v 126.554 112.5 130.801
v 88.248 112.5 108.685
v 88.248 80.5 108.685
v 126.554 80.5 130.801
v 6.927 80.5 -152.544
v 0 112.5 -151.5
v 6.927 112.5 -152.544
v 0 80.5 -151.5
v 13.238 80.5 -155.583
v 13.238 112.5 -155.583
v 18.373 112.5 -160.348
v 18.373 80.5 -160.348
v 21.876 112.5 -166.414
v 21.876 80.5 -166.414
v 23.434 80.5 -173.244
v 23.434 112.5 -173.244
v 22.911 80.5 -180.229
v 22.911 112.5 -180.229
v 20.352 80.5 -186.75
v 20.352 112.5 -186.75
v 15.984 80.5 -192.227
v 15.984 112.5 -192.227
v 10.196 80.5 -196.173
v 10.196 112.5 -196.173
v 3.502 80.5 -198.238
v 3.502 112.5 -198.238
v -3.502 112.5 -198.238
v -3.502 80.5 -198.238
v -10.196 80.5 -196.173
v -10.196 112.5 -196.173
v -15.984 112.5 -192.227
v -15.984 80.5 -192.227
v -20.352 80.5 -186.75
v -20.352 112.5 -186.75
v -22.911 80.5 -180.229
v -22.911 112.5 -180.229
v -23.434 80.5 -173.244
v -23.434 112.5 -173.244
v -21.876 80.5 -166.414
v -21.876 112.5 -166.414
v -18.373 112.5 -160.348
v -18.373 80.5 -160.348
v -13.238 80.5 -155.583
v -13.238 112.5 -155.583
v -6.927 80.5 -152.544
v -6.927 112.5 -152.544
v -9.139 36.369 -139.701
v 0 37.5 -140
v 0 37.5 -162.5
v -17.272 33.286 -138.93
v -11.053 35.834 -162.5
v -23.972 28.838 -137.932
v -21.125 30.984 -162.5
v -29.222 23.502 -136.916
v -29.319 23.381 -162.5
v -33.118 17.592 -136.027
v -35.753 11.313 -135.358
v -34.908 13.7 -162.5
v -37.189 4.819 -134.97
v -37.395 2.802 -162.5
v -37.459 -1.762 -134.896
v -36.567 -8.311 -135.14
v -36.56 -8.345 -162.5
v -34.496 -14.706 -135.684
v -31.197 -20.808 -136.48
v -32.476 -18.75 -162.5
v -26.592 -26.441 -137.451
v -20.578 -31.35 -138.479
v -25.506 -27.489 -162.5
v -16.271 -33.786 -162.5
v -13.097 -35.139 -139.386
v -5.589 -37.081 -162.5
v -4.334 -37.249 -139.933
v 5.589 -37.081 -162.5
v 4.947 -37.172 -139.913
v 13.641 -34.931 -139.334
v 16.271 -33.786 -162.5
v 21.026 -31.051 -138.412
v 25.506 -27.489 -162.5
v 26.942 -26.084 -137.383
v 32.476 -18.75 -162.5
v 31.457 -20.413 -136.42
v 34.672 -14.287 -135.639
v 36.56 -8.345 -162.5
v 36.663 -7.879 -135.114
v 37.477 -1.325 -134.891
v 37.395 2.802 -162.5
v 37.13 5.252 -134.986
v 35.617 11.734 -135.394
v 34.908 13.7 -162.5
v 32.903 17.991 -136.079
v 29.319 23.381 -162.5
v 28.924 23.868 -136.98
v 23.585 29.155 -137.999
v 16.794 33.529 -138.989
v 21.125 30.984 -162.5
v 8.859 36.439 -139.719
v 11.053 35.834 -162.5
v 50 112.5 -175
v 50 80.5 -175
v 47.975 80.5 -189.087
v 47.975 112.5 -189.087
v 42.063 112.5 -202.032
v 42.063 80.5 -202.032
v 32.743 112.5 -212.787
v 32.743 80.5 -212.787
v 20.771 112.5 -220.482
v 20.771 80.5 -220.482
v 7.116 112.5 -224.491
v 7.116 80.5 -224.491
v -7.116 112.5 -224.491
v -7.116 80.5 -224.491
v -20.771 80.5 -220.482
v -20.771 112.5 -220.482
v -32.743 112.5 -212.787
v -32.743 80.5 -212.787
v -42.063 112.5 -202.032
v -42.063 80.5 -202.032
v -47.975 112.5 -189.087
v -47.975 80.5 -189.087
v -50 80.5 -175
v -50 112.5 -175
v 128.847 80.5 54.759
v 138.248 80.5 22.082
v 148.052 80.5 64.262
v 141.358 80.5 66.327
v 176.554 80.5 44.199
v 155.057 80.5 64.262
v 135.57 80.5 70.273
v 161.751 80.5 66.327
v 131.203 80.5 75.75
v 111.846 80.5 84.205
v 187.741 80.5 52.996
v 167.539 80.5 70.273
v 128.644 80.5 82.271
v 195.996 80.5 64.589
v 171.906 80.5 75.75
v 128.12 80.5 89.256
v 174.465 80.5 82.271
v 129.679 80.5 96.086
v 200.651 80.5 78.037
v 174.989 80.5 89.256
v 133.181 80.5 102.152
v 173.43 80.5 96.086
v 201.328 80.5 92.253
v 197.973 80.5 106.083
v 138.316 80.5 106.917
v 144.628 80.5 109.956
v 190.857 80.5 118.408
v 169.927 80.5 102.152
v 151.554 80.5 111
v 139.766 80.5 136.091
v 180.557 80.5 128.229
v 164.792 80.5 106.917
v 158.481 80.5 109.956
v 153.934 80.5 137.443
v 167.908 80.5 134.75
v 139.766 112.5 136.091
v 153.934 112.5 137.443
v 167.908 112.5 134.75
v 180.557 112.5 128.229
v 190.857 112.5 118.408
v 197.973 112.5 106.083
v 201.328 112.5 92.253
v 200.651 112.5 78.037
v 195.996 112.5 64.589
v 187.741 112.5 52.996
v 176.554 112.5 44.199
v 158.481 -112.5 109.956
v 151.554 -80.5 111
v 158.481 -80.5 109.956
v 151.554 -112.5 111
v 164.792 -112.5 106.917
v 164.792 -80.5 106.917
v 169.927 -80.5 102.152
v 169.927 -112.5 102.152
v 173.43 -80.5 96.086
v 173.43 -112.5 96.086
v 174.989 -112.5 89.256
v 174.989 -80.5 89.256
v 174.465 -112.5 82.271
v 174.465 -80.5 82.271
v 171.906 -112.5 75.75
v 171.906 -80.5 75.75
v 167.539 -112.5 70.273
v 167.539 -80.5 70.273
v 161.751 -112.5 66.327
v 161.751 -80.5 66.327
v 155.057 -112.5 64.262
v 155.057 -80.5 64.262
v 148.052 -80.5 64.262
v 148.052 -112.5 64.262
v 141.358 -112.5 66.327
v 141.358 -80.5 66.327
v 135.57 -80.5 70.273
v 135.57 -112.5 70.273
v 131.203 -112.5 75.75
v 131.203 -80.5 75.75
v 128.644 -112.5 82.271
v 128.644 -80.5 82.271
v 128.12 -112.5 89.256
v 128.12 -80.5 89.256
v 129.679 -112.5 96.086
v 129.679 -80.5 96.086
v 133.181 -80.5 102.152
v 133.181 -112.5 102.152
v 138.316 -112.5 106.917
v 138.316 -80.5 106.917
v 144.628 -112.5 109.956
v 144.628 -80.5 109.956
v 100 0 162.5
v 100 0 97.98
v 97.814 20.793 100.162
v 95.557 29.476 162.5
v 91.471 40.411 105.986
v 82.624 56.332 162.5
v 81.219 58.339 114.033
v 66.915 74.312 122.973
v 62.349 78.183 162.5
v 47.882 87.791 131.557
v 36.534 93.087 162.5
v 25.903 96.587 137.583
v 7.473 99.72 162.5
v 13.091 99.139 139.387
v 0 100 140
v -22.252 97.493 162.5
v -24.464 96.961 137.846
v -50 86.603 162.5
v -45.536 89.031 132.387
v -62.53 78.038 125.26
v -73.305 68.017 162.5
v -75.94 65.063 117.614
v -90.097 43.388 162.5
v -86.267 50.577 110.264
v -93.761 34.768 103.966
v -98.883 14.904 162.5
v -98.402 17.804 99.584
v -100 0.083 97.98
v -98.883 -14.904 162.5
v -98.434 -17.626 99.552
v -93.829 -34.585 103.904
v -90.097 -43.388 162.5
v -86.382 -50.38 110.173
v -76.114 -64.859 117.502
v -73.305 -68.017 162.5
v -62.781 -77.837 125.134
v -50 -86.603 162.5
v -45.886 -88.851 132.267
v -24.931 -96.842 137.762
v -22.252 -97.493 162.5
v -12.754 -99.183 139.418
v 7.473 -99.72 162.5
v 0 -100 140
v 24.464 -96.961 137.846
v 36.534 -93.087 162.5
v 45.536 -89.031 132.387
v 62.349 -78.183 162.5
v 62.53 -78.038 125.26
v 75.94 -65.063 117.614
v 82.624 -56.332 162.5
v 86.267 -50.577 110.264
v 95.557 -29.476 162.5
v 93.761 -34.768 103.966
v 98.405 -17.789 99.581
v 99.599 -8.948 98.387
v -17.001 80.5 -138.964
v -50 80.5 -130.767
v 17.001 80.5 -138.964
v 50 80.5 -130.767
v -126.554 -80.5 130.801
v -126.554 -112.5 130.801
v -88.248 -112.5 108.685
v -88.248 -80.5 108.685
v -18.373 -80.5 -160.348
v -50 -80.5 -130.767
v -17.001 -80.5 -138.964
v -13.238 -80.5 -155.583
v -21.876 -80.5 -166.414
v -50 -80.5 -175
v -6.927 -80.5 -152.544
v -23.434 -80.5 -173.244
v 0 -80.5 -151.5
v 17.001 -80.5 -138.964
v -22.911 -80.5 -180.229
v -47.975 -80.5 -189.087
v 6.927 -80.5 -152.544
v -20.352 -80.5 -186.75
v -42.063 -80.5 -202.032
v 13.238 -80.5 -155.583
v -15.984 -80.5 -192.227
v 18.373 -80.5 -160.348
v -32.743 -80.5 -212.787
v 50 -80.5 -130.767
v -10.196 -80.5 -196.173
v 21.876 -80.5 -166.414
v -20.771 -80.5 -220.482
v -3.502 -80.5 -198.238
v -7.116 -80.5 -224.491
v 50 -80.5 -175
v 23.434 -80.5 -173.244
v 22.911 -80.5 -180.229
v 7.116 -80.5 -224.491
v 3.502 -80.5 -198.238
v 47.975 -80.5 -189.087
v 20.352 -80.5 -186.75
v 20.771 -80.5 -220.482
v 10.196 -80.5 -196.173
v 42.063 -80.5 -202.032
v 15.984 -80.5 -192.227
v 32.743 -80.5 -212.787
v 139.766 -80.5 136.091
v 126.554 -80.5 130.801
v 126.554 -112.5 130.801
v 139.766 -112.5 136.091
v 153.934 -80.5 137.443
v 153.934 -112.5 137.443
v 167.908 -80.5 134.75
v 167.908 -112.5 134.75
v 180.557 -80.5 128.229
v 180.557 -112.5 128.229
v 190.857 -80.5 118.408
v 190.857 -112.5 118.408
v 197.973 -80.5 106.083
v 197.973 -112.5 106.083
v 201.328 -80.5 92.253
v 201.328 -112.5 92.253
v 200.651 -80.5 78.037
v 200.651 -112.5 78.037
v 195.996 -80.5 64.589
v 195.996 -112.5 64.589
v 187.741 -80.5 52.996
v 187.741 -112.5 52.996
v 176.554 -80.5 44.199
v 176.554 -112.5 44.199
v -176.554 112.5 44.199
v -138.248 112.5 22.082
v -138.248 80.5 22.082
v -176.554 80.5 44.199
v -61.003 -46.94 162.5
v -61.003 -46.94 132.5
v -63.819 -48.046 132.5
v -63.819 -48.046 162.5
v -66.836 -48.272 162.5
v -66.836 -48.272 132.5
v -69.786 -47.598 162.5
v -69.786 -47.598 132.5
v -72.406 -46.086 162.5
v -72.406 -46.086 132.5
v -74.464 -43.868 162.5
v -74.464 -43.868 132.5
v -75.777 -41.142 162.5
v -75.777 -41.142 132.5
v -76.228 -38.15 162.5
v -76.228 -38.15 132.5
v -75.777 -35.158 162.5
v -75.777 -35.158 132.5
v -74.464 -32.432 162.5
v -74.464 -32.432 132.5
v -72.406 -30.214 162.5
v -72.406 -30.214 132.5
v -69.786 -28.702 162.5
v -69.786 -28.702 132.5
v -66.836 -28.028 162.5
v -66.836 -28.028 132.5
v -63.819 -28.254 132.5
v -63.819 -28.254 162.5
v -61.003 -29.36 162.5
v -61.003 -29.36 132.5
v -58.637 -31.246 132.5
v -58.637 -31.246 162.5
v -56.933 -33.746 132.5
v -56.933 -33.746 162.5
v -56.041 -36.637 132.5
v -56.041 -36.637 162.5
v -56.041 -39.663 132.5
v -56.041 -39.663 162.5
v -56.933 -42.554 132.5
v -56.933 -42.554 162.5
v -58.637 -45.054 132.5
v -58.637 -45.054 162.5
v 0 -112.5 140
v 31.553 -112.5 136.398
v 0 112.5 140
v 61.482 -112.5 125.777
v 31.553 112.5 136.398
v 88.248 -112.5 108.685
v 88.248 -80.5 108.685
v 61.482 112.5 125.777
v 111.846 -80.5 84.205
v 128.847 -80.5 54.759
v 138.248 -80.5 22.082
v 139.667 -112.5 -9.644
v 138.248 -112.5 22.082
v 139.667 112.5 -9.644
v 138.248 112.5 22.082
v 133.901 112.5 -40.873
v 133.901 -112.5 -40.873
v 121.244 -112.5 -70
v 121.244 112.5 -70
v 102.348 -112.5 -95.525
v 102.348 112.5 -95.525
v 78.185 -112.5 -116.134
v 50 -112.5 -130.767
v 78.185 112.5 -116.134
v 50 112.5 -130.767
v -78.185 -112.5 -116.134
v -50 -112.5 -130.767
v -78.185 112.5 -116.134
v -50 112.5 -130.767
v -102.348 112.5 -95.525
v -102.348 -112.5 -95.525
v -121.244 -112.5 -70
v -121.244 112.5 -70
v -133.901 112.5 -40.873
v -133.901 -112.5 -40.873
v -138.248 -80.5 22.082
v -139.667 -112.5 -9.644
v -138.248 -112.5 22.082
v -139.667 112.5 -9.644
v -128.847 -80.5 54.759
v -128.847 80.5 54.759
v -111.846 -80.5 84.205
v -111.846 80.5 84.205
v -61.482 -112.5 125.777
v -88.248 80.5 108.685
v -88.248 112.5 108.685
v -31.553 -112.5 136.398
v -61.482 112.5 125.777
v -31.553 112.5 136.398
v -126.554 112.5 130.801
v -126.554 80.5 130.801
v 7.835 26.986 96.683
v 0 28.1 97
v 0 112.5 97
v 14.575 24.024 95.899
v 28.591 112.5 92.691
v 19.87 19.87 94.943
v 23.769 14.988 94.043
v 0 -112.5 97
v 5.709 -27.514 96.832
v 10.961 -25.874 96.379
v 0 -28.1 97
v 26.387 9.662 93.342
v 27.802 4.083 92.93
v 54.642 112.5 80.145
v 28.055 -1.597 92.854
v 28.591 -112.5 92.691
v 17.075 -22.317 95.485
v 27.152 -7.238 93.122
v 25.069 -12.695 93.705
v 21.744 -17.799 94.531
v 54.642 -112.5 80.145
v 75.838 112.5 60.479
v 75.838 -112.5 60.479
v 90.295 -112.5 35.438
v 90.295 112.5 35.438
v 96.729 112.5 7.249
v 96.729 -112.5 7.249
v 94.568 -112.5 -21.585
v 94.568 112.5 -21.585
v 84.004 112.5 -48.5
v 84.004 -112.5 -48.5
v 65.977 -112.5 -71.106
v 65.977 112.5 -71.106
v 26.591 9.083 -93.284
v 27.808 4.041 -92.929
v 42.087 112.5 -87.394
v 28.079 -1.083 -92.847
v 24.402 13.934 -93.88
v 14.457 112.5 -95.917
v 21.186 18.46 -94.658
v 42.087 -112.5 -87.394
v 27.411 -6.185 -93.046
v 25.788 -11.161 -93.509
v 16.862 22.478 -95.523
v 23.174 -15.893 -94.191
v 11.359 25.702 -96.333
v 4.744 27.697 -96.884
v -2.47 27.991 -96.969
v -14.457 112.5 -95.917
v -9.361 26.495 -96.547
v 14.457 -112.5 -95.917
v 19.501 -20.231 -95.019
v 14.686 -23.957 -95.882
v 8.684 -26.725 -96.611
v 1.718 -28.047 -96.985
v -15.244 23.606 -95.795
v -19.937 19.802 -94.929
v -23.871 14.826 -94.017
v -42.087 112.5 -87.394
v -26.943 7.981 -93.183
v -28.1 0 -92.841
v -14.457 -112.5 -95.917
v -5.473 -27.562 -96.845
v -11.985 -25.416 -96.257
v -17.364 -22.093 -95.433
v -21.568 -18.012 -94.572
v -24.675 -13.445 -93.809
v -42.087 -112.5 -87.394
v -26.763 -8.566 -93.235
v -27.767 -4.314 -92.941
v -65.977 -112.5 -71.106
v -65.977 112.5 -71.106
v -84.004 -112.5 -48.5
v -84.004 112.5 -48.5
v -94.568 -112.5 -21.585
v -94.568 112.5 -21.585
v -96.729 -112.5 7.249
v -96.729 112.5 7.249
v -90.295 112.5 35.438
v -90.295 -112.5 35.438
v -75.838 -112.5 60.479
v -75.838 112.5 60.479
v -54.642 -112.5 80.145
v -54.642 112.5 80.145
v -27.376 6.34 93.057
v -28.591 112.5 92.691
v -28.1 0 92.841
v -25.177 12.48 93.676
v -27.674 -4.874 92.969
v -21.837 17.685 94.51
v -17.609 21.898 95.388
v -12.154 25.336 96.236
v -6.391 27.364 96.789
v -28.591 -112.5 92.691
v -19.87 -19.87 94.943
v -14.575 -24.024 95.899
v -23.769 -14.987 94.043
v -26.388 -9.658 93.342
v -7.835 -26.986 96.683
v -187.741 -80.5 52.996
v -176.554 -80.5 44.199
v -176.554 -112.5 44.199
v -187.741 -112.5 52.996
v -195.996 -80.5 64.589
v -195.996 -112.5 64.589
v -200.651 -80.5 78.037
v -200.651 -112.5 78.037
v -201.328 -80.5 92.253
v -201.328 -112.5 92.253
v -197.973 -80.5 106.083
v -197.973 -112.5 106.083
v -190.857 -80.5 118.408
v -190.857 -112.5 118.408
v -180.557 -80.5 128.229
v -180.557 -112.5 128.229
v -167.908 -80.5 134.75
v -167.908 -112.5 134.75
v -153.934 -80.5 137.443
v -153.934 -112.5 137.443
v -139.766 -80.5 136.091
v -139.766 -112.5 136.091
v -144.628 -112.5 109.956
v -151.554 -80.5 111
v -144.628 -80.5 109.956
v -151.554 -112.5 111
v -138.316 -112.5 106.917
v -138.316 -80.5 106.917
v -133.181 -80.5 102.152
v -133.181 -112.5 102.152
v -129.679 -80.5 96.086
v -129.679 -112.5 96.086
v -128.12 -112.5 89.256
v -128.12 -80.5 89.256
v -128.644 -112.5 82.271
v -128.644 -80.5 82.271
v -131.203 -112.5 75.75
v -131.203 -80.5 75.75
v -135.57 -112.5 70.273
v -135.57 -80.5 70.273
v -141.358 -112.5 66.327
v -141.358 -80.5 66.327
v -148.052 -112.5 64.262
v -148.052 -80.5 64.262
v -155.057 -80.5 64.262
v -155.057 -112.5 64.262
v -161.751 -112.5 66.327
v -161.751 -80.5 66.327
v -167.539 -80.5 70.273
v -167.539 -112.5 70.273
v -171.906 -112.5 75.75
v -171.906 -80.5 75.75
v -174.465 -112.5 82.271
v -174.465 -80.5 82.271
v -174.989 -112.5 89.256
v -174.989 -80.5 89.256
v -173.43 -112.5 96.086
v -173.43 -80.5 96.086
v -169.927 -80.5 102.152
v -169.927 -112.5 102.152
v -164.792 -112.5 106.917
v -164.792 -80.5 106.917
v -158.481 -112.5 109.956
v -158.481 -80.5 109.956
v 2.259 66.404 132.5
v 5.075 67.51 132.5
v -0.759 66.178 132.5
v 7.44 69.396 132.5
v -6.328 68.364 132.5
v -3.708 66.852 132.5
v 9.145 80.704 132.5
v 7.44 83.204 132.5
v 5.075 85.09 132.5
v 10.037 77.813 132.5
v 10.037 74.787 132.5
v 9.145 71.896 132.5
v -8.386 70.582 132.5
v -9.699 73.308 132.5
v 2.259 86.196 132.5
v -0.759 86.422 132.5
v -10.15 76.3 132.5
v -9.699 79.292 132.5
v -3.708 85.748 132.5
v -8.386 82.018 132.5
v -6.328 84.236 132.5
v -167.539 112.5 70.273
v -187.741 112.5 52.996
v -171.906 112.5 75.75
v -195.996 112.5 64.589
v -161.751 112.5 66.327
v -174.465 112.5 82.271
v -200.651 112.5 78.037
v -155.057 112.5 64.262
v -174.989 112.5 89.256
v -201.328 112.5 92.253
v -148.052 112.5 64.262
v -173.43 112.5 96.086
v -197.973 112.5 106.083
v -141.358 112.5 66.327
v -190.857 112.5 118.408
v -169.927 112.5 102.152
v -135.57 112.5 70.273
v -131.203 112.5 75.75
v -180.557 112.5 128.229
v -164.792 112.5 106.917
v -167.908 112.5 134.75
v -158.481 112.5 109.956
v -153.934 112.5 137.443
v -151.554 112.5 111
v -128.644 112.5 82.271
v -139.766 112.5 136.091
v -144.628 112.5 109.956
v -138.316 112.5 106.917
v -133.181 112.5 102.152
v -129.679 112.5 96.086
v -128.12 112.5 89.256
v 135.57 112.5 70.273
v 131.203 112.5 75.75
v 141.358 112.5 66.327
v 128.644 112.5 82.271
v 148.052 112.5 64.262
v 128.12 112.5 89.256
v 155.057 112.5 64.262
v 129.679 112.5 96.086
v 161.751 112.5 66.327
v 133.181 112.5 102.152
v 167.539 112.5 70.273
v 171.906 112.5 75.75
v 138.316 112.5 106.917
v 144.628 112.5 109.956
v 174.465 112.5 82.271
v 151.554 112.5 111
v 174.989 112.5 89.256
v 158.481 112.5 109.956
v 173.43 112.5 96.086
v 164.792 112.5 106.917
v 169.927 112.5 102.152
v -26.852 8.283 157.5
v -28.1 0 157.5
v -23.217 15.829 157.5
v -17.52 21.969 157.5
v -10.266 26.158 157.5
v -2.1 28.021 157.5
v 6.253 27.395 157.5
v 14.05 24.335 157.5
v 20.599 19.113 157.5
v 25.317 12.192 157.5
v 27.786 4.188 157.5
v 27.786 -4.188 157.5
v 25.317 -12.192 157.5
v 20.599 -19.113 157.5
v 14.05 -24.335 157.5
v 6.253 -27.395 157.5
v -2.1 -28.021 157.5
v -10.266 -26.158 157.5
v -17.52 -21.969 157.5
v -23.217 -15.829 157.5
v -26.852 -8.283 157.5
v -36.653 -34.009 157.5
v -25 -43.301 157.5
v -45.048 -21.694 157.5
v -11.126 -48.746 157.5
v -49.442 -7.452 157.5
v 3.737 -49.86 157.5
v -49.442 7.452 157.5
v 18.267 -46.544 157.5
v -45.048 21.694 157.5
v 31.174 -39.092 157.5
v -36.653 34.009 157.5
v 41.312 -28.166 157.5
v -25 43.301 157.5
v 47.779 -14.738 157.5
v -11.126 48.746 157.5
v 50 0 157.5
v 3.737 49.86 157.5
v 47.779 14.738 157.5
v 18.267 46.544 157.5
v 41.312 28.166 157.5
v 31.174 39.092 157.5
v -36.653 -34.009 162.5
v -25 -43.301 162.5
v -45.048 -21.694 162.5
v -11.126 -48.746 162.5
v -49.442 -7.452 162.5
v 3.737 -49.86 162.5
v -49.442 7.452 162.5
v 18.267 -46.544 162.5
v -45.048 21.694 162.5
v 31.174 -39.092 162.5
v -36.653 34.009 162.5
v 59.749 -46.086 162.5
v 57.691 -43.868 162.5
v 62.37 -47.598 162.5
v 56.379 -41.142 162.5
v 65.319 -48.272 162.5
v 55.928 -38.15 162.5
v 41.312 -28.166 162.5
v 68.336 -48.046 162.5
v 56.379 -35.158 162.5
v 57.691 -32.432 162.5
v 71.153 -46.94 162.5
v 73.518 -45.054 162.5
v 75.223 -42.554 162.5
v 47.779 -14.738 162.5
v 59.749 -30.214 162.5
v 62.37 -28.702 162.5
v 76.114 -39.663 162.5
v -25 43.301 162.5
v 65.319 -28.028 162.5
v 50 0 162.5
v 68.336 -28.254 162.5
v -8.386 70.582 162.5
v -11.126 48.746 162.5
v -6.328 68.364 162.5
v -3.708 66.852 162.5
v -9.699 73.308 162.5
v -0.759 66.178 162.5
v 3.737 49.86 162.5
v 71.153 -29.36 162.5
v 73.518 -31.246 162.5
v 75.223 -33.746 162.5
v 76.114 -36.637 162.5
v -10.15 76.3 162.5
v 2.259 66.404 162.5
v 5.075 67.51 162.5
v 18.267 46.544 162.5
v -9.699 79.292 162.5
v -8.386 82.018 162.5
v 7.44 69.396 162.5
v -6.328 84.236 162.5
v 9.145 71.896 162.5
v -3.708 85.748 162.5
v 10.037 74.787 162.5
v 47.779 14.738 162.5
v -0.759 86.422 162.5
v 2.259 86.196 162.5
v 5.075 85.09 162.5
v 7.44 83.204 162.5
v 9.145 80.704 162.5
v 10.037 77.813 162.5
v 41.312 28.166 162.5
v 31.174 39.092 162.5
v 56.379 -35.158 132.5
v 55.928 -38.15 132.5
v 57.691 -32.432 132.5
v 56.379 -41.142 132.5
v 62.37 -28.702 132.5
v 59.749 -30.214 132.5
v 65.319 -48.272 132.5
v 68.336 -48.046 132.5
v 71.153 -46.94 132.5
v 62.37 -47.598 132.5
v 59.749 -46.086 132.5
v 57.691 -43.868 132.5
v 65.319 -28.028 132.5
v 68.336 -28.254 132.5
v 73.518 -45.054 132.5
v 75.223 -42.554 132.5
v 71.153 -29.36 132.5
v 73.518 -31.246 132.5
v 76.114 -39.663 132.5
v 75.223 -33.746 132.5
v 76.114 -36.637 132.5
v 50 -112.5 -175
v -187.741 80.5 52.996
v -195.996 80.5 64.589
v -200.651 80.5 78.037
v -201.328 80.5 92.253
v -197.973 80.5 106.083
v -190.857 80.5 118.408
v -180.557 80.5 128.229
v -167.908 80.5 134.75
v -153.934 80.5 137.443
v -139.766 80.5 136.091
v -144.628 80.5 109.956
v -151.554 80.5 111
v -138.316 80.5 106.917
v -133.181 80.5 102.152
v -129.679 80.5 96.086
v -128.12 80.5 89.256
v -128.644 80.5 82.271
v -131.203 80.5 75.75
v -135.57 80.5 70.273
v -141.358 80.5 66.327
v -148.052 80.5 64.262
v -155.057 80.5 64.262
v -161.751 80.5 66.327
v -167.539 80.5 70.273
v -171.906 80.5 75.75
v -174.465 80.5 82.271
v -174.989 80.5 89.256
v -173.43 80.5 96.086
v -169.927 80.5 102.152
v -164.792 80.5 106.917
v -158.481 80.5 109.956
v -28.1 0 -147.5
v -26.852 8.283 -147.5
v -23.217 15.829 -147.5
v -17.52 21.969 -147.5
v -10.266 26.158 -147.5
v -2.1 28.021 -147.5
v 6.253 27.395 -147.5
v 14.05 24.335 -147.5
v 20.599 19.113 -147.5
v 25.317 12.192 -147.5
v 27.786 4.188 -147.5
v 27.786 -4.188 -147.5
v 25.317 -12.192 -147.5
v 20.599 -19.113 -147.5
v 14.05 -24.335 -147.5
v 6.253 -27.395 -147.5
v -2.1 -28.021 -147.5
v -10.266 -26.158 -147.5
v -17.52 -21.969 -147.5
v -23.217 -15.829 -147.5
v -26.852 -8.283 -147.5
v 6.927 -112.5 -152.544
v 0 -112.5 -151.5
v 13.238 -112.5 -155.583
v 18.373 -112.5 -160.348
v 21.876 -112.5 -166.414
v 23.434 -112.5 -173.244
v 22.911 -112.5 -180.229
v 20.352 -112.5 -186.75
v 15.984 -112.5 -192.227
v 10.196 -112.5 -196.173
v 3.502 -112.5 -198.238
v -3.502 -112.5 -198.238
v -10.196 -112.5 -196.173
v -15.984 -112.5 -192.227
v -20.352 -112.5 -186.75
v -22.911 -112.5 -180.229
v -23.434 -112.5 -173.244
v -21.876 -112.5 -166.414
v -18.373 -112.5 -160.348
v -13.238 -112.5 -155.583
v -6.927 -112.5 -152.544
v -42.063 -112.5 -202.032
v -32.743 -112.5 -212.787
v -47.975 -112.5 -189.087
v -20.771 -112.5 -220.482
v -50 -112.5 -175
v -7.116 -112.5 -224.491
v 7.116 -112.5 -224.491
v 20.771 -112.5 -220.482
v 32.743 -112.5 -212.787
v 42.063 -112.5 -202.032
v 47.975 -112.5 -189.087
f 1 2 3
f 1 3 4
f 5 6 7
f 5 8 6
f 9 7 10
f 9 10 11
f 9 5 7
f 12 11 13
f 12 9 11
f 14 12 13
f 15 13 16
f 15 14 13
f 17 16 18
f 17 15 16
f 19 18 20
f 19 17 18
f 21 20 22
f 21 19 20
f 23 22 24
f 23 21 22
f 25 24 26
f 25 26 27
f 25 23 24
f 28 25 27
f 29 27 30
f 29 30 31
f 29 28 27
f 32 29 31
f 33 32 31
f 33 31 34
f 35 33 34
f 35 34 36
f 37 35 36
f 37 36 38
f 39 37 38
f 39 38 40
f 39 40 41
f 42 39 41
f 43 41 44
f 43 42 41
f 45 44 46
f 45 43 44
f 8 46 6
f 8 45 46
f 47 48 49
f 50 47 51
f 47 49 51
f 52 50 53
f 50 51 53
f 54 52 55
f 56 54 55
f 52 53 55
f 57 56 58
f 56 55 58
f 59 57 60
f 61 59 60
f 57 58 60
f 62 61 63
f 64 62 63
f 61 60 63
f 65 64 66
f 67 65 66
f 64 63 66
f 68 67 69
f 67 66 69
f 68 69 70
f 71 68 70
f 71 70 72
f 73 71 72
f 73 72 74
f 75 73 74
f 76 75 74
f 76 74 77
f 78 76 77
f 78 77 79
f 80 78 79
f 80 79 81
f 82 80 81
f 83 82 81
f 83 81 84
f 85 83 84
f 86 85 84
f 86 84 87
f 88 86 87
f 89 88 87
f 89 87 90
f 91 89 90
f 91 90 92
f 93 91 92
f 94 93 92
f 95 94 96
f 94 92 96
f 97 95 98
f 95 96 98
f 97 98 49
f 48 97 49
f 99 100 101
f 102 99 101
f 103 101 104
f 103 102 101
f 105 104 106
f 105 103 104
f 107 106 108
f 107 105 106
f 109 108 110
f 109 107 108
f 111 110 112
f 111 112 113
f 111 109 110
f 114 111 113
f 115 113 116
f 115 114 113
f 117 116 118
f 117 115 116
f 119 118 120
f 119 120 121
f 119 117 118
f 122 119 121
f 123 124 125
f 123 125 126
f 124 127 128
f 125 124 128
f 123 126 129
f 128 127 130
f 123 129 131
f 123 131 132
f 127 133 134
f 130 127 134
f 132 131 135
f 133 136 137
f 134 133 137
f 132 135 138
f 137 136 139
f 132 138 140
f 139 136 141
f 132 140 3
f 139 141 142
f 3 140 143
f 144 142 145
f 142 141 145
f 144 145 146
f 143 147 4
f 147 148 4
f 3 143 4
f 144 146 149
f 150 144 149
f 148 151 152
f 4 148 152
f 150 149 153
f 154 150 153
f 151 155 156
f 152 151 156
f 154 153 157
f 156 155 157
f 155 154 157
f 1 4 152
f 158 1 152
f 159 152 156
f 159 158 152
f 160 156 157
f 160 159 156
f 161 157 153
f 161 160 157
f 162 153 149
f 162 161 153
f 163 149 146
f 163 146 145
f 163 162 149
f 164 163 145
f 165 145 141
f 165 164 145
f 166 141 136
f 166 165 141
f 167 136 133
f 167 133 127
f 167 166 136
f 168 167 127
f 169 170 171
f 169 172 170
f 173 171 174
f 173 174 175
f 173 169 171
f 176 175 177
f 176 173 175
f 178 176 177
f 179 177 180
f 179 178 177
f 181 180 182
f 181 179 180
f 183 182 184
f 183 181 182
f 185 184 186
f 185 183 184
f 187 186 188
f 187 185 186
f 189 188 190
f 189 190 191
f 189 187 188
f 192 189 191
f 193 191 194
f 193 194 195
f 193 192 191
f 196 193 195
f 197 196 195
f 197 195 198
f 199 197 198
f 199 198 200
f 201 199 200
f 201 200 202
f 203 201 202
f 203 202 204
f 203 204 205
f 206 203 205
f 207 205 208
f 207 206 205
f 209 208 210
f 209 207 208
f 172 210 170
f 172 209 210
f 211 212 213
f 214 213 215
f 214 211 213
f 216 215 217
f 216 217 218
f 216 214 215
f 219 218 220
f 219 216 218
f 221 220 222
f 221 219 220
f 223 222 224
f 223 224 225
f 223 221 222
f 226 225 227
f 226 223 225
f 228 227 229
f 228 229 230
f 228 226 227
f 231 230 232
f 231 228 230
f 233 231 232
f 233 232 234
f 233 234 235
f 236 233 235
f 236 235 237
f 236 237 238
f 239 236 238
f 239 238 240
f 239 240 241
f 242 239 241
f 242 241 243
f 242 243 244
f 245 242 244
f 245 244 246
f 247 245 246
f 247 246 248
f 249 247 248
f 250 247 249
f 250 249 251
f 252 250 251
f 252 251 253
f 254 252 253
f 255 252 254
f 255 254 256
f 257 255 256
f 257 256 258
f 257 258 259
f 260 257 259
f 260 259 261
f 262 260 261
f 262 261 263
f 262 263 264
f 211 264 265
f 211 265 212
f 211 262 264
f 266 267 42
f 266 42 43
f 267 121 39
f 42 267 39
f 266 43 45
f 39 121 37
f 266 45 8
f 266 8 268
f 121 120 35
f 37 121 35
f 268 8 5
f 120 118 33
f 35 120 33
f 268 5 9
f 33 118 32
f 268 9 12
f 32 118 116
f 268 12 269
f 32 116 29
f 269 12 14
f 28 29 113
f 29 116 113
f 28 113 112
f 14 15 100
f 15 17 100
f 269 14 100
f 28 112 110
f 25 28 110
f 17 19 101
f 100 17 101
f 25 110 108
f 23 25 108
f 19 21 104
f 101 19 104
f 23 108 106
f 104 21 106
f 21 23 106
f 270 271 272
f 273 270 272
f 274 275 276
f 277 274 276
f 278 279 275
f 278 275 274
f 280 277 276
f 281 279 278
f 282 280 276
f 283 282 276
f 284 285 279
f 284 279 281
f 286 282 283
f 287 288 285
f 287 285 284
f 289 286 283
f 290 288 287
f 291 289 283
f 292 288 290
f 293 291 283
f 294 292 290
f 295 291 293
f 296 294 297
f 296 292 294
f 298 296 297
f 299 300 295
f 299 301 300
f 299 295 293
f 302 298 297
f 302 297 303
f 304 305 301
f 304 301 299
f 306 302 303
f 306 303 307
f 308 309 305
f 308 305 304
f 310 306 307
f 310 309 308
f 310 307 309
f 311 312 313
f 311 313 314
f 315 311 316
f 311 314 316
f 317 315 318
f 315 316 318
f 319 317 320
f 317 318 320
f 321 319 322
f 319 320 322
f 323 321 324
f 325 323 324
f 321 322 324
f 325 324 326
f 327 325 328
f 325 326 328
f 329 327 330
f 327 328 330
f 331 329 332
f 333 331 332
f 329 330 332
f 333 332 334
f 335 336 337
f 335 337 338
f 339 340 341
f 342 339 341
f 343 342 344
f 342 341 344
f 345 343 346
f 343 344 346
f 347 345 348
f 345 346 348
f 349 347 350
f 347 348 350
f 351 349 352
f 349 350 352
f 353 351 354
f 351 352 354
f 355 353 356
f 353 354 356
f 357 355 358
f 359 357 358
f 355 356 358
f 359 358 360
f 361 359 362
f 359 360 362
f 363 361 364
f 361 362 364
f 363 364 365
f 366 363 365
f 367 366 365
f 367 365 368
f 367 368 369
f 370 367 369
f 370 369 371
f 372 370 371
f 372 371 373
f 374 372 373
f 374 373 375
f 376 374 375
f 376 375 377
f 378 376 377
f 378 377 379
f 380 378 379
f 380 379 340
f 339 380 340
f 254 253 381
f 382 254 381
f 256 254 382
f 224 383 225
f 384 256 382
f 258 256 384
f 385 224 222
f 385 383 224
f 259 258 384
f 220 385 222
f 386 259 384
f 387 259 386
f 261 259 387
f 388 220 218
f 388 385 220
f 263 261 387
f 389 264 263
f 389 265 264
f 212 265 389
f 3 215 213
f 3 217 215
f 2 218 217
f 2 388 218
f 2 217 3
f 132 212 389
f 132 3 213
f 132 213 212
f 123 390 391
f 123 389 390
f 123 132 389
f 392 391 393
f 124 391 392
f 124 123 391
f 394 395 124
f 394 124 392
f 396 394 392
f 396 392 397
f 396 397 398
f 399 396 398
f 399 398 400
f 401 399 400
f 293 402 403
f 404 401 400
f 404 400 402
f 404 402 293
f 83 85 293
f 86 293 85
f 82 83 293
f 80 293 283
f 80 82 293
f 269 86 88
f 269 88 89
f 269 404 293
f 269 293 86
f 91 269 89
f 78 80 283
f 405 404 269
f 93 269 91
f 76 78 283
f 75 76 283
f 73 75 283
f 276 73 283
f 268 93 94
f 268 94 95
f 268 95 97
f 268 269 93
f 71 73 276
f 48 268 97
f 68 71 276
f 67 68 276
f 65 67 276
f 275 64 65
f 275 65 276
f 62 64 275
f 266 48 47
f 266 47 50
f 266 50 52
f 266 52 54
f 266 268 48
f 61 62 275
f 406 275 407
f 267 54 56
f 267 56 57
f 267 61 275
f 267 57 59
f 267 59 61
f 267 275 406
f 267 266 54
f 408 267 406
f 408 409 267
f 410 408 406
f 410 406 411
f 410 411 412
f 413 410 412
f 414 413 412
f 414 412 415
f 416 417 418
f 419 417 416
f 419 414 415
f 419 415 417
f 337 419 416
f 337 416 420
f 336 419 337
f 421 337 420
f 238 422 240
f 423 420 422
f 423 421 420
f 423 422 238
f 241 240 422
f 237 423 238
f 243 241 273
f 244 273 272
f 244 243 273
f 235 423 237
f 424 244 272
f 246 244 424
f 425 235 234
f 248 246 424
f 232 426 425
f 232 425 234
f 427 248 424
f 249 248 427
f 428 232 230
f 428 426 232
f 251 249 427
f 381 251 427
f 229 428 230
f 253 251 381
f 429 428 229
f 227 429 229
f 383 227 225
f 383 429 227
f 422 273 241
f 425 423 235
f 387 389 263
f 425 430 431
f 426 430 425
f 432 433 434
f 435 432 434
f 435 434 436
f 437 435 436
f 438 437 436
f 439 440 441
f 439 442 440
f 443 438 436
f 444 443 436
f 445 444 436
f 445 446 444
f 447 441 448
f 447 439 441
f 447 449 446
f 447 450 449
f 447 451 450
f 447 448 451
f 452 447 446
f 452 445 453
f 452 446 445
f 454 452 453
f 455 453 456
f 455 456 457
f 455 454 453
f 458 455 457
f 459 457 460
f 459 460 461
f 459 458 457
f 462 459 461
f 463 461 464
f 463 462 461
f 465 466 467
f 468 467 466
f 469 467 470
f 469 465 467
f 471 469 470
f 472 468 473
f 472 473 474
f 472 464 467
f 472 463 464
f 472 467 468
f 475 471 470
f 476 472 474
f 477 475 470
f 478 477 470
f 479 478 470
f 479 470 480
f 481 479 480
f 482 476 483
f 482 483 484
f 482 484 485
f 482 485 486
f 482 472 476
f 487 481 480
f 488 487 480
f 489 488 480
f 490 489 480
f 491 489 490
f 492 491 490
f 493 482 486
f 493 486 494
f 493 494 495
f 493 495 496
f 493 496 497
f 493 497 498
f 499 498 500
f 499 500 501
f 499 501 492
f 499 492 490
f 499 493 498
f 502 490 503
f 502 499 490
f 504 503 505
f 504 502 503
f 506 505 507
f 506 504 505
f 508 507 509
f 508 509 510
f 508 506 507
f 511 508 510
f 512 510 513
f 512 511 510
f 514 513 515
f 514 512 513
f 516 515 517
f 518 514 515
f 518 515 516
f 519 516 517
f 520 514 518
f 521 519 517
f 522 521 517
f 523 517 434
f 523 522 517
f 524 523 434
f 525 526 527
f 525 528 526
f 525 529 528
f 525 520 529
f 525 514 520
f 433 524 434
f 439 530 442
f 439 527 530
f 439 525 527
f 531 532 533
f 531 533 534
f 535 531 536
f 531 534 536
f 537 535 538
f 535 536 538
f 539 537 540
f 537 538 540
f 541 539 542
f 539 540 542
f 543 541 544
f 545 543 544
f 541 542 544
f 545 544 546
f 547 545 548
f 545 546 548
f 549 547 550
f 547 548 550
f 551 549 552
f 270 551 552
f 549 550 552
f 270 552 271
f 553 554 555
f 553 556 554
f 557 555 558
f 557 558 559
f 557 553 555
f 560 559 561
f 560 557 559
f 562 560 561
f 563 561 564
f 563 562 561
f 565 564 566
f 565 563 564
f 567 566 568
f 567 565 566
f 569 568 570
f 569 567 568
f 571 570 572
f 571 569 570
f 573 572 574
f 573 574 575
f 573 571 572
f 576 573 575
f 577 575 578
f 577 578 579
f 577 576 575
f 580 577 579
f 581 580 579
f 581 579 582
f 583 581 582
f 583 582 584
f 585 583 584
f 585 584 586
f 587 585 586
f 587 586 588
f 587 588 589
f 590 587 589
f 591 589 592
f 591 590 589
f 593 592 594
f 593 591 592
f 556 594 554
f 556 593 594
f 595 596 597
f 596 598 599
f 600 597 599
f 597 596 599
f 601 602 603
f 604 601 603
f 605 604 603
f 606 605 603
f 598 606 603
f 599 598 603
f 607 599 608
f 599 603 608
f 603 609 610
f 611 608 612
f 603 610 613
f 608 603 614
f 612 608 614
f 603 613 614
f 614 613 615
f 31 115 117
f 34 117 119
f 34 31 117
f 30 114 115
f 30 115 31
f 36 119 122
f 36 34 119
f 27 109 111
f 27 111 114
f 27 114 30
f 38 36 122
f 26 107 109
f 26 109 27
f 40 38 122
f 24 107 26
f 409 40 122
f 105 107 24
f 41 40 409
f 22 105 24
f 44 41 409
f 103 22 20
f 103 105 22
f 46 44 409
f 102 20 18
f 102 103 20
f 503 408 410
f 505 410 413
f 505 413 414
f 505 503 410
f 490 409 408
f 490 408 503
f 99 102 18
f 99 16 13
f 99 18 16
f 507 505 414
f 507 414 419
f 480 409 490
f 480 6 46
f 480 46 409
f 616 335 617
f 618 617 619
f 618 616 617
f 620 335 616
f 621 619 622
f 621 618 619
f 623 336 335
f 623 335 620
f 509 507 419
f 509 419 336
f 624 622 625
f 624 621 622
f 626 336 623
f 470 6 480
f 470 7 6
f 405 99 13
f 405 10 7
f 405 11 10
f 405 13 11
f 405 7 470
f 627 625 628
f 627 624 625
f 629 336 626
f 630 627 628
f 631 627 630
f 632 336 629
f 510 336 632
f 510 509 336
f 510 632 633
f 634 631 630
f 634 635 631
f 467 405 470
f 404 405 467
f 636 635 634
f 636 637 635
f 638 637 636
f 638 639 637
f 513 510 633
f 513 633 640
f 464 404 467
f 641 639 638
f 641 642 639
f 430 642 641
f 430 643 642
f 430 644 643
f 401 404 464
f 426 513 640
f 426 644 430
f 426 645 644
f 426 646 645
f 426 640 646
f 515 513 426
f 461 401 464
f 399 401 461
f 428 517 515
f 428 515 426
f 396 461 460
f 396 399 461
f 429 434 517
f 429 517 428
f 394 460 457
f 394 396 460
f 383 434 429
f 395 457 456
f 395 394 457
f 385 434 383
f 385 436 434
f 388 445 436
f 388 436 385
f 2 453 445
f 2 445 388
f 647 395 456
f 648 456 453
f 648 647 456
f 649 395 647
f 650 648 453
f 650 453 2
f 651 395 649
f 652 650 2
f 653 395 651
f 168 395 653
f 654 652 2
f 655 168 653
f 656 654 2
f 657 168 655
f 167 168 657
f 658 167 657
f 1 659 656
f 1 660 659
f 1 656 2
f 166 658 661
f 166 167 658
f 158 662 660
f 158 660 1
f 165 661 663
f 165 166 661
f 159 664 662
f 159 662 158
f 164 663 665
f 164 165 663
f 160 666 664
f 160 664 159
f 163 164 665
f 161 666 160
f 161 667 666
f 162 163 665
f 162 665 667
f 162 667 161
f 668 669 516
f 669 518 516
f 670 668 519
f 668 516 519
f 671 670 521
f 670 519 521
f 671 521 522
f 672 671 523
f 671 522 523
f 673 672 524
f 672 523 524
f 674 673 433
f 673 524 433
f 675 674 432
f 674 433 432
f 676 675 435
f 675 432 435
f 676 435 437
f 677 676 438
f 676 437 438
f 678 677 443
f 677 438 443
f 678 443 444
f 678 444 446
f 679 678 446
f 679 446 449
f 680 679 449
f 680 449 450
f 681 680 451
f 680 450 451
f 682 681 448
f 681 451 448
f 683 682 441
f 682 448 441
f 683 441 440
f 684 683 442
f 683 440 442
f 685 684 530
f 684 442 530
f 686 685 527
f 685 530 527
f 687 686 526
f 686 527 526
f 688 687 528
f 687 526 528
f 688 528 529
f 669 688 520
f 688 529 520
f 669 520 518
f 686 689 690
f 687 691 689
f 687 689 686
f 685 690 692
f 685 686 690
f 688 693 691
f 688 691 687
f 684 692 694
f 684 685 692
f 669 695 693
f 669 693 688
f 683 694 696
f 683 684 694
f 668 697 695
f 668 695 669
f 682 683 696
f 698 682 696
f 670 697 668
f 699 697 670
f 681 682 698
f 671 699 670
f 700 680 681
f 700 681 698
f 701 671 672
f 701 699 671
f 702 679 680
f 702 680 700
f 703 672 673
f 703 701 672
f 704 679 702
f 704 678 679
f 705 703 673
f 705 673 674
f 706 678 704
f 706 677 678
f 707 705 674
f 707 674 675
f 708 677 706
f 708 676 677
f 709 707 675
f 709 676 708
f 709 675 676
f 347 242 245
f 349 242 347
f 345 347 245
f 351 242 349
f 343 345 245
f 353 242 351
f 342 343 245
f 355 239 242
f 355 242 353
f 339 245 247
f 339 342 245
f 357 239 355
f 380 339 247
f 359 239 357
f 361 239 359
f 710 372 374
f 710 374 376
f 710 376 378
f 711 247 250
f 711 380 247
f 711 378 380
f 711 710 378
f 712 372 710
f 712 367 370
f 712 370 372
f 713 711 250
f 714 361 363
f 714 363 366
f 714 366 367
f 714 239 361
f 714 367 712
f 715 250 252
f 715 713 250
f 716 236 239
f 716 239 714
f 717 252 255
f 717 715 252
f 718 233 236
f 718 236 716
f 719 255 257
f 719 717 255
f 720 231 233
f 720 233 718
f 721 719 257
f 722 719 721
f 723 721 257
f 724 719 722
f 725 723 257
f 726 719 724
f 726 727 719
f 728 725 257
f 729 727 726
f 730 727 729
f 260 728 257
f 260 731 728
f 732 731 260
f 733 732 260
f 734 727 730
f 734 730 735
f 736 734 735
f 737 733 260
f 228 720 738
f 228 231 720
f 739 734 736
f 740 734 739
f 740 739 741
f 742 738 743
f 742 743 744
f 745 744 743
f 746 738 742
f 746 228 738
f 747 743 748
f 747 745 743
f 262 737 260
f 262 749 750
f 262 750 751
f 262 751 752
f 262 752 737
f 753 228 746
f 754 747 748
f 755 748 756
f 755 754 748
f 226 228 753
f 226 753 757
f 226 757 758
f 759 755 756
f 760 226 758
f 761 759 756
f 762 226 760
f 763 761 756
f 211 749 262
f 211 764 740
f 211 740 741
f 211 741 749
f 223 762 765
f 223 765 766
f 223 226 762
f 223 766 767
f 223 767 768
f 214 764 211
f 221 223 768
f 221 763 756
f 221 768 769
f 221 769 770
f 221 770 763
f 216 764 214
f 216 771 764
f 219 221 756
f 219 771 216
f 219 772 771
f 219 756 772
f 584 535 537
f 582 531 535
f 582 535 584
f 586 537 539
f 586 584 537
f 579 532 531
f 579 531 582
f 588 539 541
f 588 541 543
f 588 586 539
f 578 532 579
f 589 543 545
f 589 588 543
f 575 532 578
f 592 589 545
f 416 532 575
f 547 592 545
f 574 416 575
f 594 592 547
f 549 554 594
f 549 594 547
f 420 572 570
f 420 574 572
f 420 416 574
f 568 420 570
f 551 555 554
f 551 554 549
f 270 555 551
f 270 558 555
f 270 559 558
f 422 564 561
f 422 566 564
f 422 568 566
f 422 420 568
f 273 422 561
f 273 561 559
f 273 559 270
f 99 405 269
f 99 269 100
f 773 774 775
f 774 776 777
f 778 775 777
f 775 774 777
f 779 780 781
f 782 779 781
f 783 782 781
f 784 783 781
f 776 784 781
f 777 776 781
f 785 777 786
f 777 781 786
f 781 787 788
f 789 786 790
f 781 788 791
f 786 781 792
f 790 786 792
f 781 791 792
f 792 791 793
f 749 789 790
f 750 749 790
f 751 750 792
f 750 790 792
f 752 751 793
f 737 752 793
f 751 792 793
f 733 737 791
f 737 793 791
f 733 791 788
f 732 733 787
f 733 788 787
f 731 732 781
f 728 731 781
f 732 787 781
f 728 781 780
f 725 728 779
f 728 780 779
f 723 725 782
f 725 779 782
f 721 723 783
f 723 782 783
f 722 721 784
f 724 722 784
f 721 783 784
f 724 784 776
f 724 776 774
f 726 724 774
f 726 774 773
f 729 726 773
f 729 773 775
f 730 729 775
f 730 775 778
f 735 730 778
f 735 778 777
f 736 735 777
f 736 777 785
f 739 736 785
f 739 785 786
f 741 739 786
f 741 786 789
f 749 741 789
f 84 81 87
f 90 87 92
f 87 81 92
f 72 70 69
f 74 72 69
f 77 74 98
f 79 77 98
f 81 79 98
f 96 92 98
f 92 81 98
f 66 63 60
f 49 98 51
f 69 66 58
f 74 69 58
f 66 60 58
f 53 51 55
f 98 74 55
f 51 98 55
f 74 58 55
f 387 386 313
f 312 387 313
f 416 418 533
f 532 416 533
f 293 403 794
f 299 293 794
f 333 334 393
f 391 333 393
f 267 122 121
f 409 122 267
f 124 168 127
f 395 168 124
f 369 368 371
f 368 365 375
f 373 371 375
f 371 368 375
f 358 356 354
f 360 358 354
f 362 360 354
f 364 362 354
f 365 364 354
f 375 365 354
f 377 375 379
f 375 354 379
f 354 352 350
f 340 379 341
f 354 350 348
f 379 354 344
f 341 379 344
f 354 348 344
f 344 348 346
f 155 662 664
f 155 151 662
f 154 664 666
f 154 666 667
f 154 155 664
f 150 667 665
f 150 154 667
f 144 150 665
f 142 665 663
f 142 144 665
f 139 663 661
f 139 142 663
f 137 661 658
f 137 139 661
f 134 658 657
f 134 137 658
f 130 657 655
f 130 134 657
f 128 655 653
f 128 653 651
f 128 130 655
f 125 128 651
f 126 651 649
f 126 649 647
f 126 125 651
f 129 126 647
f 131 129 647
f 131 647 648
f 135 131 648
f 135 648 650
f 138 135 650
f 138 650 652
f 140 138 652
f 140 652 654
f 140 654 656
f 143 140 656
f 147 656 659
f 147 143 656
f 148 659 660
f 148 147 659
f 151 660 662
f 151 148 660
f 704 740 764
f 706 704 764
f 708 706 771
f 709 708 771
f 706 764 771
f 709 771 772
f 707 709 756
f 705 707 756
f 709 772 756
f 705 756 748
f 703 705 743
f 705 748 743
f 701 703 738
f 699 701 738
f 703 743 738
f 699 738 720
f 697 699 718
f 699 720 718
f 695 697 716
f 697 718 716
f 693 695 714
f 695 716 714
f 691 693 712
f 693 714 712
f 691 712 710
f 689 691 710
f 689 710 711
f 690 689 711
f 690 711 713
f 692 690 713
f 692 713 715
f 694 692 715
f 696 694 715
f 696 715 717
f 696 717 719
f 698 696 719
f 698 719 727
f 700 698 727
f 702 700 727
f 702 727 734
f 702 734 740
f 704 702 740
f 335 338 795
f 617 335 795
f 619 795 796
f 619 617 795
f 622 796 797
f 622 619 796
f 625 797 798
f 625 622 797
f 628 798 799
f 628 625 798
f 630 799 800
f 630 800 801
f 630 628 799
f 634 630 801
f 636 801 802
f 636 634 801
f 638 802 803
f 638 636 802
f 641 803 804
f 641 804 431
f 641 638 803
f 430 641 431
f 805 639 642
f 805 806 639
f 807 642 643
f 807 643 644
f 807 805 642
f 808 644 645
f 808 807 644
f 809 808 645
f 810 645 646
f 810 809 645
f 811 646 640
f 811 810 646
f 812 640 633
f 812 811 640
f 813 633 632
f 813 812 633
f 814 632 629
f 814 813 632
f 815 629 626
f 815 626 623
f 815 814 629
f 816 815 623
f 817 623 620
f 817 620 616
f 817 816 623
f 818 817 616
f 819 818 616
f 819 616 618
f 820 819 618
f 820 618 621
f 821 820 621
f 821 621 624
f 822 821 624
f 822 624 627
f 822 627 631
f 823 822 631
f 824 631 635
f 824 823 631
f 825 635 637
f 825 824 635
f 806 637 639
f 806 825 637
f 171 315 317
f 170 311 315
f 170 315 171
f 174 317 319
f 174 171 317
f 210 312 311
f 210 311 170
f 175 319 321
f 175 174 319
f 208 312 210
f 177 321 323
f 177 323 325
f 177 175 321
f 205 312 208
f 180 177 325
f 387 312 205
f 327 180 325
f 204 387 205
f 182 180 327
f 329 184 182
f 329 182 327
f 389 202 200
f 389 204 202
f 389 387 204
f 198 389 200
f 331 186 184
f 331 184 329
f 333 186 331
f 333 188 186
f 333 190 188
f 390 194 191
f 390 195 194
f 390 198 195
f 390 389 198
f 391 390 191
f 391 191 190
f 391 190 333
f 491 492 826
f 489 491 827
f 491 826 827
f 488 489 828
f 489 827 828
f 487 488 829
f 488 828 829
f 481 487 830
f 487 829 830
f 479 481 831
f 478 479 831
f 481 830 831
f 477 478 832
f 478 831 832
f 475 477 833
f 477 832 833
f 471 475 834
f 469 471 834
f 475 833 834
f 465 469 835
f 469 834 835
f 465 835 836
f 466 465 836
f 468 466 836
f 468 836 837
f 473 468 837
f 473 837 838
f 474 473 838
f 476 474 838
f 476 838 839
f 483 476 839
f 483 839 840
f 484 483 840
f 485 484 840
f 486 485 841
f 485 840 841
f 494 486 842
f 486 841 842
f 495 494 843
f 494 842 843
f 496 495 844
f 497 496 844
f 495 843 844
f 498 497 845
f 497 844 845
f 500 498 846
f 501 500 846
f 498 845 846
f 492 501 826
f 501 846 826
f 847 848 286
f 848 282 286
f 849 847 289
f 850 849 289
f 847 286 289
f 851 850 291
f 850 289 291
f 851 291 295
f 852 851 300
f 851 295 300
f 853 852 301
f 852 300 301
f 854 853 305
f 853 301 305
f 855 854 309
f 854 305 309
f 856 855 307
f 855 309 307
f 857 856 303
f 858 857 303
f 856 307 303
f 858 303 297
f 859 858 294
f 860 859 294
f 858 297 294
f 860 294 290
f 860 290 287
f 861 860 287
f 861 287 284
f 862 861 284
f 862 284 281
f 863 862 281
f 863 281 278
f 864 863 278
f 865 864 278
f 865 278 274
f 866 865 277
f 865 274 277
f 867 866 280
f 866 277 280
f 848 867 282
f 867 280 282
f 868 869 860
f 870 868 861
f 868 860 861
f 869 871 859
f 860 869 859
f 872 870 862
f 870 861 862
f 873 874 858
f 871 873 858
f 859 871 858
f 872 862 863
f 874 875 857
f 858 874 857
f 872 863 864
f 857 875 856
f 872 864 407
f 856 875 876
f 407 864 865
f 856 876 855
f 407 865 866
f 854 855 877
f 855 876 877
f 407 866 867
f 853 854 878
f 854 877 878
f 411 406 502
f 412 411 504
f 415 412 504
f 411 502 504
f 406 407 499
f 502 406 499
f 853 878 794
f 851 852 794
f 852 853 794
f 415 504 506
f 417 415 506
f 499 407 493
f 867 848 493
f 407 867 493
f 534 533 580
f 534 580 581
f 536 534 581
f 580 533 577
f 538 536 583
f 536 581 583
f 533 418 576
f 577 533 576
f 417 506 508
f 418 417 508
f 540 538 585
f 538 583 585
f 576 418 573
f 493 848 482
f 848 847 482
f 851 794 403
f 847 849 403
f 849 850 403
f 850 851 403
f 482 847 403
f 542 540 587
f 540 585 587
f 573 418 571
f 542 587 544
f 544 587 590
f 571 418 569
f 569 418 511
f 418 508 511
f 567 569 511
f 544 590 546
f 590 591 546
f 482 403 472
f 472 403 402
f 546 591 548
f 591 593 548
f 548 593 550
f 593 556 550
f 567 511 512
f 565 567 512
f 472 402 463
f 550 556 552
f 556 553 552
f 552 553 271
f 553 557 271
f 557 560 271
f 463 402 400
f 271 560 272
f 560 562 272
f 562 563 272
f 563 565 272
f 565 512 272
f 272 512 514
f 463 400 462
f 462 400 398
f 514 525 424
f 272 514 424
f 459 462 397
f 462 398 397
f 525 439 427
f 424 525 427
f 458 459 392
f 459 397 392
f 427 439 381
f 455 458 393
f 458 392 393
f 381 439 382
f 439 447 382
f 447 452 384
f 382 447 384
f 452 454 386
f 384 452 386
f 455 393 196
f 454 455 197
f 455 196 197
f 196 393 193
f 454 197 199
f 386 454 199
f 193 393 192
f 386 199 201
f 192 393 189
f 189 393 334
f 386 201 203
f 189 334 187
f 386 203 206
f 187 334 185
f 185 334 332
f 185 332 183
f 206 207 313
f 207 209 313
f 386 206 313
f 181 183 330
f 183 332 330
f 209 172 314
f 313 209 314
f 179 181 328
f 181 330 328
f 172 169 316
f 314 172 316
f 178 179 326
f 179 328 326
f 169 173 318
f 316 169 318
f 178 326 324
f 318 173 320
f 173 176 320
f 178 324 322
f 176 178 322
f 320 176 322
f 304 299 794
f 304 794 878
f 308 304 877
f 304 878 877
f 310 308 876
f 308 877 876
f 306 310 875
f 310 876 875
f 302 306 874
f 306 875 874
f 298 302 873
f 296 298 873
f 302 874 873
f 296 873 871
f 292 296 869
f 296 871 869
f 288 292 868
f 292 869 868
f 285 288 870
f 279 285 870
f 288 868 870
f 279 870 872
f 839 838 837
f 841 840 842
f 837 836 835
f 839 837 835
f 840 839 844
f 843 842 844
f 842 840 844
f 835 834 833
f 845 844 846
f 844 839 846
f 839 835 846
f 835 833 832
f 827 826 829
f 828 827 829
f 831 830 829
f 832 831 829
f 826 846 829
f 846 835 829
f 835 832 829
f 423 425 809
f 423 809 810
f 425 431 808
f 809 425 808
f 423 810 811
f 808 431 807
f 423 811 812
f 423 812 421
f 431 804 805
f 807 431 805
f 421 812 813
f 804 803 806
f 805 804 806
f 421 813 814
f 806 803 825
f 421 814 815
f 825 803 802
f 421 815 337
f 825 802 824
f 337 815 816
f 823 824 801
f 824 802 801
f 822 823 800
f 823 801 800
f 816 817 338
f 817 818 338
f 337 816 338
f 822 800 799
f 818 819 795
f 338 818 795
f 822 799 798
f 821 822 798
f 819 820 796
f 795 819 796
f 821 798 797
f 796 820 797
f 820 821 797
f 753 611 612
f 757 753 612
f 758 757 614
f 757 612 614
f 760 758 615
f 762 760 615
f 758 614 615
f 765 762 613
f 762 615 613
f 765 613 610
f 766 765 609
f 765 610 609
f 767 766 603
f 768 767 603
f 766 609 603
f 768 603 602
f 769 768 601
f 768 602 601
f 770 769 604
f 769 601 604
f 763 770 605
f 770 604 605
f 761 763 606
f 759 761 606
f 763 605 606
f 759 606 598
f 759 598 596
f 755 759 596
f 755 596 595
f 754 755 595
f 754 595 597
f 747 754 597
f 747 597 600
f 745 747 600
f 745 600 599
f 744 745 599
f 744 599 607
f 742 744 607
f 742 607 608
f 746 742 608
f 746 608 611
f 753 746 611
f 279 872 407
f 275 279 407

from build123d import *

# Parameters (mm, degrees)
SKETCH1_R                = 140
SKETCH1_R_2              = 97
BOSS_EXTRUDE1_DEPTH      = 112.5
BOSS_EXTRUDE2_REACH      = 353.799
BOSS_EXTRUDE2_END_RADIUS = 140
SKETCH2_R                = 100
BOSS_EXTRUDE3_REACH      = 373.324
BOSS_EXTRUDE3_END_RADIUS = 140
SKETCH3_R                = 37.5
HOLE1_D                  = 20.3
HOLE1_DEPTH              = 30
CIRPATTERN2_COUNT        = 3
HOLE2_D                  = 56.2
HOLE2_DEPTH              = 310
HOLE2_CBORE_D            = 100
HOLE2_CBORE_DEPTH        = 5
BOSS_EXTRUDE6_DEPTH      = 32
CIRPATTERN5_COUNT        = 3
SKETCH16_W               = 23.5
SKETCH16_H               = 32
HOLE3_AT_2_COUNT         = 2
HOLE3_AT_2_PITCH         = 303.108891325
HOLE3_AT_3_COUNT         = 2
HOLE3_AT_3_PITCH         = 303.108891325
MIRROR1_COPY_1_DEPTH     = 32
MIRROR1_COPY_2_DEPTH     = 32
MIRROR1_COPY_3_SKETCH_W  = 23.5
MIRROR1_COPY_3_SKETCH_H  = 32
MIRROR1_COPY_4_SKETCH_W  = 23.5
MIRROR1_COPY_4_SKETCH_H  = 32


with BuildPart() as part:
    # Sketch1 → Boss-Extrude1 (new, symmetric)
    with BuildSketch(Plane(origin=(0, 0, 0), x_dir=(1, 0, 0), z_dir=(0, 1, 0))):
        with Locations(Location((0, 0, 0), (0, 0, 270))):
            Circle(SKETCH1_R)
        with Locations(Location((0, 0, 0), (0, 0, 270))):
            Circle(SKETCH1_R_2, mode=Mode.SUBTRACT)
    extrude(amount=BOSS_EXTRUDE1_DEPTH, both=True)

    # Boss-Extrude2: up to this cylinder (the profile starts outside it)
    boss_extrude2_end = Plane(origin=(0, 0, 0), z_dir=(0, -1, 0)) * Cylinder(BOSS_EXTRUDE2_END_RADIUS, 988.598, mode=Mode.PRIVATE)
    # Sketch2 → Boss-Extrude2 (add, up to the surface)
    with BuildSketch(Plane.XY.offset(162.5), mode=Mode.PRIVATE) as boss_extrude2_sk1:
        Circle(SKETCH2_R)
    boss_extrude2_tool1 = extrude(boss_extrude2_sk1.sketch, amount=-BOSS_EXTRUDE2_REACH, mode=Mode.PRIVATE) - boss_extrude2_end
    add(boss_extrude2_tool1.solids().sort_by_distance((0, 0, 162.5))[0])

    # Boss-Extrude3: up to this cylinder (the profile starts outside it)
    boss_extrude3_end = Plane(origin=(0, 0, 0), z_dir=(0, -1, 0)) * Cylinder(BOSS_EXTRUDE3_END_RADIUS, 1027.648, mode=Mode.PRIVATE)
    # Sketch3 → Boss-Extrude3 (add, up to the surface)
    with BuildSketch(Plane.XY.offset(-162.5), mode=Mode.PRIVATE) as boss_extrude3_sk1:
        with Locations(Location((0, 0, 0), (0, 0, 90))):
            Circle(SKETCH3_R)
    boss_extrude3_tool1 = extrude(boss_extrude3_sk1.sketch, amount=BOSS_EXTRUDE3_REACH, mode=Mode.PRIVATE) - boss_extrude3_end
    add(boss_extrude3_tool1.solids().sort_by_distance((0, 0, -162.5))[0])

    # Hole1
    with Locations(Plane.XY.offset(162.5)):
        with Locations((0, 76.3)):
            hole1 = Hole(HOLE1_D / 2, depth=HOLE1_DEPTH)

    # CirPattern2: Hole1 ×3 about axis
    cirpattern2_axis = Axis((0, 0, 0), (0, 0, 1))
    for i in range(1, CIRPATTERN2_COUNT):
        add(hole1.rotate(cirpattern2_axis, i * 360 / CIRPATTERN2_COUNT), mode=Mode.SUBTRACT)

    # Hole2
    with Locations(Plane.XY.offset(162.5)):
        with Locations((0, 0)):
            CounterBoreHole(HOLE2_D / 2, HOLE2_CBORE_D / 2, HOLE2_CBORE_DEPTH, depth=HOLE2_DEPTH)

    # Sketch10 → Boss-Extrude6 (add)
    with BuildSketch(Plane(origin=(0, 112.5, 0), x_dir=(1, 0, 0), z_dir=(0, 1, 0))):
        with BuildLine():
            Line((50, 130.766968306), (50, 175))
            ThreePointArc((50, 175), (0, 225), (-50, 175))
            Line((-50, 175), (-50, 130.766968306))
            ThreePointArc((-50, 130.766968306), (0, 140), (50, 130.766968306))
        make_face()
    boss_extrude6 = extrude(amount=-BOSS_EXTRUDE6_DEPTH)

    # CirPattern5: Boss-Extrude6 ×3 about axis
    cirpattern5_axis = Axis((0, 0, 0), (0, 1, 0))
    for i in range(1, CIRPATTERN5_COUNT):
        add(boss_extrude6.rotate(cirpattern5_axis, i * 360 / CIRPATTERN5_COUNT))

    # Sketch16 → Hole3 (revolve, cut)
    with BuildSketch(Plane(origin=(0, 112.5, -175), x_dir=(0, 0, 1), z_dir=(1, 0, 0))):
        with Locations((11.75, 16)):
            Rectangle(SKETCH16_W, SKETCH16_H)
    hole3 = revolve(axis=Axis((0, 2.5, -175), (0, 1, 0)), mode=Mode.SUBTRACT)

    # Hole3 at 2: Hole3 ×2
    with Locations(*[Vector(0.500000000000004, 0, 0.8660254037844364) * (i * HOLE3_AT_2_PITCH) for i in range(1, HOLE3_AT_2_COUNT)]):
        add(hole3, mode=Mode.SUBTRACT)

    # Hole3 at 3: Hole3 ×2
    with Locations(*[Vector(-0.49999999999999806, 0, 0.8660254037844397) * (i * HOLE3_AT_3_PITCH) for i in range(1, HOLE3_AT_3_COUNT)]):
        add(hole3, mode=Mode.SUBTRACT)

    # Mirror1: Boss-Extrude6, Hole3 across plane
    add(boss_extrude6.mirror(Plane.ZX))
    add(hole3.mirror(Plane.ZX), mode=Mode.SUBTRACT)

    # Mirror1 copy 1 sketch → Mirror1 copy 1 (add)
    with BuildSketch(Plane(origin=(0, -112.5, 0), x_dir=(-0.4999999999999998, 0, -0.8660254037844387), z_dir=(0, -1, 0))):
        with BuildLine():
            Line((50, -130.766968306), (50, -175))
            ThreePointArc((50, -175), (0, -225), (-50, -175))
            Line((-50, -175), (-50, -130.766968306))
            ThreePointArc((-50, -130.766968306), (0, -140), (50, -130.766968306))
        make_face()
    extrude(amount=-MIRROR1_COPY_1_DEPTH)

    # Mirror1 copy 2 sketch → Mirror1 copy 2 (add)
    with BuildSketch(Plane(origin=(0, -112.5, 0), x_dir=(-0.5000000000000004, 0, 0.8660254037844384), z_dir=(0, -1, 0))):
        with BuildLine():
            Line((50, -130.766968306), (50, -175))
            ThreePointArc((50, -175), (0, -225), (-50, -175))
            Line((-50, -175), (-50, -130.766968306))
            ThreePointArc((-50, -130.766968306), (0, -140), (50, -130.766968306))
        make_face()
    extrude(amount=-MIRROR1_COPY_2_DEPTH)

    # Mirror1 copy 3 sketch → Mirror1 copy 3 (revolve, cut)
    with BuildSketch(Plane(origin=(151.554445662, -112.5, 87.5), x_dir=(0, 0, 1), z_dir=(1, 0, 0))):
        with Locations((11.75, -16)):
            Rectangle(MIRROR1_COPY_3_SKETCH_W, MIRROR1_COPY_3_SKETCH_H)
    revolve(axis=Axis((151.554445662, -2.5, 87.5), (0, 1, 0)), mode=Mode.SUBTRACT)

    # Mirror1 copy 4 sketch → Mirror1 copy 4 (revolve, cut)
    with BuildSketch(Plane(origin=(-151.554445662, -112.5, 87.5), x_dir=(0, 0, 1), z_dir=(1, 0, 0))):
        with Locations((11.75, -16)):
            Rectangle(MIRROR1_COPY_4_SKETCH_W, MIRROR1_COPY_4_SKETCH_H)
    revolve(axis=Axis((-151.554445662, -2.5, 87.5), (0, 1, 0)), mode=Mode.SUBTRACT)


solid = part.part
